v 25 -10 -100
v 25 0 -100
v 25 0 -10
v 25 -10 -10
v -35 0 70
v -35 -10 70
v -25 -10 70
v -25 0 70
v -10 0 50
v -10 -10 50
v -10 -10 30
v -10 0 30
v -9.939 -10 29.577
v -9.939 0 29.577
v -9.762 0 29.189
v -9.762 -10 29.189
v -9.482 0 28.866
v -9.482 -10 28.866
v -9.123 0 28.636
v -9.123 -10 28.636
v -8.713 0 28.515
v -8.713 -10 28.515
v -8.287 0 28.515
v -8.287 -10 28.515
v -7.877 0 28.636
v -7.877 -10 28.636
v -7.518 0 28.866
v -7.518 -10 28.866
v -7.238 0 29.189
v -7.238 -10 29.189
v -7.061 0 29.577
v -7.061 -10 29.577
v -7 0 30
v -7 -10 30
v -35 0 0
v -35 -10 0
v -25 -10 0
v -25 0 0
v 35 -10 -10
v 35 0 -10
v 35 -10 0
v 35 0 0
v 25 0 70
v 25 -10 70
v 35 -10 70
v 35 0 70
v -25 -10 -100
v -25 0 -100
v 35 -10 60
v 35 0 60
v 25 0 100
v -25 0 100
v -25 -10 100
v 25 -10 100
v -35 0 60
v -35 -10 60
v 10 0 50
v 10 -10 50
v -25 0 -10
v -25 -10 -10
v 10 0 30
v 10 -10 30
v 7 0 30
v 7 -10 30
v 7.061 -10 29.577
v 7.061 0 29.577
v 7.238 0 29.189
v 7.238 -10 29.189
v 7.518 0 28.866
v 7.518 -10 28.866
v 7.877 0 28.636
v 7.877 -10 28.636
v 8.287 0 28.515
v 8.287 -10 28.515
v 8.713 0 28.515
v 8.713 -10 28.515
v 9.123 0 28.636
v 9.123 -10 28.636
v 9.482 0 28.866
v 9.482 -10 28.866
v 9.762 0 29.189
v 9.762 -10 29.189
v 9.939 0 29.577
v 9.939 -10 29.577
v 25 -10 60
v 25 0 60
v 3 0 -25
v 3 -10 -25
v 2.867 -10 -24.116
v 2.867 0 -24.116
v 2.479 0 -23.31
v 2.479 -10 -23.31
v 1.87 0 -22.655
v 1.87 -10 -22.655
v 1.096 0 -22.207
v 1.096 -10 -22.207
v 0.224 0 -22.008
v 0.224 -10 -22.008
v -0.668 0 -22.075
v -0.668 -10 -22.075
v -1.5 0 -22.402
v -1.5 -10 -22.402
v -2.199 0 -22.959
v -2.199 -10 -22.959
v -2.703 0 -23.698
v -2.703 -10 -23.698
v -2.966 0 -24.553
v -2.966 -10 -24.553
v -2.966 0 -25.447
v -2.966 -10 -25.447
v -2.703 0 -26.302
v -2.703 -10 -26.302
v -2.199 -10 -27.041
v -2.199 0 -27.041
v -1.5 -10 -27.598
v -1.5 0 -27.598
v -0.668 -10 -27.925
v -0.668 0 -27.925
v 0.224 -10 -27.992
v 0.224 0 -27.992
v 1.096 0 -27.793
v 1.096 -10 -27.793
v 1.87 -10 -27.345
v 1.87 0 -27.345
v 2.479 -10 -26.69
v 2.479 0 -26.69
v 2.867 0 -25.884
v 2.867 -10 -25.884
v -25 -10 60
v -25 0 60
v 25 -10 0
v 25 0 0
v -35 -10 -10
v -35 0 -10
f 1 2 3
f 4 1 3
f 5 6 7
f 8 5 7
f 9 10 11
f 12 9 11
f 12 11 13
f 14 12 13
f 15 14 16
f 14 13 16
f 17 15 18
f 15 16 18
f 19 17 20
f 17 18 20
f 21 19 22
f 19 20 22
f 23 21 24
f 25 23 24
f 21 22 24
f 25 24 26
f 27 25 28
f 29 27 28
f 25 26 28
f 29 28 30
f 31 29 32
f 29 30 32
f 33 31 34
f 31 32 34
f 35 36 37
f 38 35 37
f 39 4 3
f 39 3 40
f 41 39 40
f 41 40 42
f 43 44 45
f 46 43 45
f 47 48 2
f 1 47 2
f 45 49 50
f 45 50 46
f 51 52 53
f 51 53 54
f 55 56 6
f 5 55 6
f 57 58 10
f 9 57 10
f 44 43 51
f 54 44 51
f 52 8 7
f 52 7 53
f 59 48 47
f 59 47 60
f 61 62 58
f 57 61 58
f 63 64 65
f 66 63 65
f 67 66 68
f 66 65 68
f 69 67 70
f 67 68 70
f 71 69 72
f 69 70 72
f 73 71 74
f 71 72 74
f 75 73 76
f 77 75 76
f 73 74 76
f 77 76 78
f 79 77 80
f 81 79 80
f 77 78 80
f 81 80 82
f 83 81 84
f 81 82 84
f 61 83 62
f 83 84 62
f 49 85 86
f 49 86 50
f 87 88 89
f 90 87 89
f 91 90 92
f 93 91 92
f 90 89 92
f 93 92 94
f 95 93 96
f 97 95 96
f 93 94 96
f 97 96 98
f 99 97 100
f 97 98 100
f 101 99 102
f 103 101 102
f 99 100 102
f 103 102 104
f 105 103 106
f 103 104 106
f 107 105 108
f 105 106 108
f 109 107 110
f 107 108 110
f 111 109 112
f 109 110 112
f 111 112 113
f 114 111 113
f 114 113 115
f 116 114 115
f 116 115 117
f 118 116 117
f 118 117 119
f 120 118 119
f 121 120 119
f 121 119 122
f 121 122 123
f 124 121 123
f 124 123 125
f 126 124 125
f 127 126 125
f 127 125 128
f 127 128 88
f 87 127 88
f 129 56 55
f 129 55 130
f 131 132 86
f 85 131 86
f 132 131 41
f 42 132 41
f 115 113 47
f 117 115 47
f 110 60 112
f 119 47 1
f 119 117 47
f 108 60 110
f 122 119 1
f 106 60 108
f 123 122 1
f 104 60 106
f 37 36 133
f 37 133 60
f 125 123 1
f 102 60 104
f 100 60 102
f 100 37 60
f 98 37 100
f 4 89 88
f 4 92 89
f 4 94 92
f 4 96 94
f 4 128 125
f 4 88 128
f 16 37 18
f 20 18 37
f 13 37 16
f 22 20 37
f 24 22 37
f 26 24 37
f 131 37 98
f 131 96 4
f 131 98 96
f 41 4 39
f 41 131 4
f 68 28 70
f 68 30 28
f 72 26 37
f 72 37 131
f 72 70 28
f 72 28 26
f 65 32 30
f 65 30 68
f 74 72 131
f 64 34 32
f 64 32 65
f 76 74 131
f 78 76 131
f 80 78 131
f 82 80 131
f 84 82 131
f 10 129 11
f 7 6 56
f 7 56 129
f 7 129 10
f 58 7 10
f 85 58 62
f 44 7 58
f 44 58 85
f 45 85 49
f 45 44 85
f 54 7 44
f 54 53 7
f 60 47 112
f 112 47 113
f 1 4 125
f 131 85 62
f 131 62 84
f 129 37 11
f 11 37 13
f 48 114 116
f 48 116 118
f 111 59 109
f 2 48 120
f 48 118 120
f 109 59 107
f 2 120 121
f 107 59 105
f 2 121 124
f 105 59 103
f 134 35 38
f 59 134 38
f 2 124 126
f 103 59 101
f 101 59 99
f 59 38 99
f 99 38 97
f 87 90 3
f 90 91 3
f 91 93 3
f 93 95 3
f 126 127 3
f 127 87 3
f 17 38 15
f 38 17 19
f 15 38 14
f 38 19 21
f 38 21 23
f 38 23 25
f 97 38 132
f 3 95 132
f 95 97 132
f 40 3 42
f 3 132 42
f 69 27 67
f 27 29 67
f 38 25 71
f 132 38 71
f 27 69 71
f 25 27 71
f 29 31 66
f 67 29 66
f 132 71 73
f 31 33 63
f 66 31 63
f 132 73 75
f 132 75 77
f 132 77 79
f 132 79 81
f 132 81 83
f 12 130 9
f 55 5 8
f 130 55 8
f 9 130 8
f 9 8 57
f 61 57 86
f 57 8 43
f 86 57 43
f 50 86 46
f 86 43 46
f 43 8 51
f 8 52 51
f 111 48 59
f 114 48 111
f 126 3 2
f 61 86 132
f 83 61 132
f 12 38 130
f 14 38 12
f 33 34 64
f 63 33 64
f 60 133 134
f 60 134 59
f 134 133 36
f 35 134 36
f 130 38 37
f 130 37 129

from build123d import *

# Parameters (mm, degrees)
F0_W     = 50
F0_H     = 200
F1_DEPTH = 10
F2_R     = 3
F3_DEPTH = 25
F5_DEPTH = 25
F6_W     = 10
F6_H     = 10
F7_DEPTH = 10


with BuildPart() as f1:
    # F0 (on Front) → F1 (new body)
    with BuildSketch(Plane.XZ):
        Rectangle(F0_W, F0_H)
    extrude(amount=F1_DEPTH)

    # F2 (on face) → F3 (cut)
    with BuildSketch(Plane.XZ.offset(10)):
        with Locations((0, -25)):
            Circle(F2_R)
    extrude(amount=-F3_DEPTH, mode=Mode.SUBTRACT)

    # F4 (on face) → F5 (cut)
    with BuildSketch(Plane.XZ.offset(10)):
        with BuildLine():
            Line((10, 50), (-10, 50))
            Line((-10, 50), (-10, 30))
            ThreePointArc((-10, 30), (-8.5, 28.5), (-7, 30))
            Line((-7, 30), (7, 30))
            ThreePointArc((7, 30), (8.5, 28.5), (10, 30))
            Line((10, 30), (10, 50))
        make_face()
    extrude(amount=-F5_DEPTH, mode=Mode.SUBTRACT)

    # F6 (on face) → F7 (join)
    with BuildSketch(Plane.XZ.offset(10)):
        with Locations((-30, 65)):
            Rectangle(F6_W, F6_H)
        with Locations((30, 65)):
            Rectangle(F6_W, F6_H)
        with Locations((-30, -5)):
            Rectangle(F6_W, F6_H)
        with Locations((30, -5)):
            Rectangle(F6_W, F6_H)
    extrude(amount=-F7_DEPTH)


solid = f1.part
